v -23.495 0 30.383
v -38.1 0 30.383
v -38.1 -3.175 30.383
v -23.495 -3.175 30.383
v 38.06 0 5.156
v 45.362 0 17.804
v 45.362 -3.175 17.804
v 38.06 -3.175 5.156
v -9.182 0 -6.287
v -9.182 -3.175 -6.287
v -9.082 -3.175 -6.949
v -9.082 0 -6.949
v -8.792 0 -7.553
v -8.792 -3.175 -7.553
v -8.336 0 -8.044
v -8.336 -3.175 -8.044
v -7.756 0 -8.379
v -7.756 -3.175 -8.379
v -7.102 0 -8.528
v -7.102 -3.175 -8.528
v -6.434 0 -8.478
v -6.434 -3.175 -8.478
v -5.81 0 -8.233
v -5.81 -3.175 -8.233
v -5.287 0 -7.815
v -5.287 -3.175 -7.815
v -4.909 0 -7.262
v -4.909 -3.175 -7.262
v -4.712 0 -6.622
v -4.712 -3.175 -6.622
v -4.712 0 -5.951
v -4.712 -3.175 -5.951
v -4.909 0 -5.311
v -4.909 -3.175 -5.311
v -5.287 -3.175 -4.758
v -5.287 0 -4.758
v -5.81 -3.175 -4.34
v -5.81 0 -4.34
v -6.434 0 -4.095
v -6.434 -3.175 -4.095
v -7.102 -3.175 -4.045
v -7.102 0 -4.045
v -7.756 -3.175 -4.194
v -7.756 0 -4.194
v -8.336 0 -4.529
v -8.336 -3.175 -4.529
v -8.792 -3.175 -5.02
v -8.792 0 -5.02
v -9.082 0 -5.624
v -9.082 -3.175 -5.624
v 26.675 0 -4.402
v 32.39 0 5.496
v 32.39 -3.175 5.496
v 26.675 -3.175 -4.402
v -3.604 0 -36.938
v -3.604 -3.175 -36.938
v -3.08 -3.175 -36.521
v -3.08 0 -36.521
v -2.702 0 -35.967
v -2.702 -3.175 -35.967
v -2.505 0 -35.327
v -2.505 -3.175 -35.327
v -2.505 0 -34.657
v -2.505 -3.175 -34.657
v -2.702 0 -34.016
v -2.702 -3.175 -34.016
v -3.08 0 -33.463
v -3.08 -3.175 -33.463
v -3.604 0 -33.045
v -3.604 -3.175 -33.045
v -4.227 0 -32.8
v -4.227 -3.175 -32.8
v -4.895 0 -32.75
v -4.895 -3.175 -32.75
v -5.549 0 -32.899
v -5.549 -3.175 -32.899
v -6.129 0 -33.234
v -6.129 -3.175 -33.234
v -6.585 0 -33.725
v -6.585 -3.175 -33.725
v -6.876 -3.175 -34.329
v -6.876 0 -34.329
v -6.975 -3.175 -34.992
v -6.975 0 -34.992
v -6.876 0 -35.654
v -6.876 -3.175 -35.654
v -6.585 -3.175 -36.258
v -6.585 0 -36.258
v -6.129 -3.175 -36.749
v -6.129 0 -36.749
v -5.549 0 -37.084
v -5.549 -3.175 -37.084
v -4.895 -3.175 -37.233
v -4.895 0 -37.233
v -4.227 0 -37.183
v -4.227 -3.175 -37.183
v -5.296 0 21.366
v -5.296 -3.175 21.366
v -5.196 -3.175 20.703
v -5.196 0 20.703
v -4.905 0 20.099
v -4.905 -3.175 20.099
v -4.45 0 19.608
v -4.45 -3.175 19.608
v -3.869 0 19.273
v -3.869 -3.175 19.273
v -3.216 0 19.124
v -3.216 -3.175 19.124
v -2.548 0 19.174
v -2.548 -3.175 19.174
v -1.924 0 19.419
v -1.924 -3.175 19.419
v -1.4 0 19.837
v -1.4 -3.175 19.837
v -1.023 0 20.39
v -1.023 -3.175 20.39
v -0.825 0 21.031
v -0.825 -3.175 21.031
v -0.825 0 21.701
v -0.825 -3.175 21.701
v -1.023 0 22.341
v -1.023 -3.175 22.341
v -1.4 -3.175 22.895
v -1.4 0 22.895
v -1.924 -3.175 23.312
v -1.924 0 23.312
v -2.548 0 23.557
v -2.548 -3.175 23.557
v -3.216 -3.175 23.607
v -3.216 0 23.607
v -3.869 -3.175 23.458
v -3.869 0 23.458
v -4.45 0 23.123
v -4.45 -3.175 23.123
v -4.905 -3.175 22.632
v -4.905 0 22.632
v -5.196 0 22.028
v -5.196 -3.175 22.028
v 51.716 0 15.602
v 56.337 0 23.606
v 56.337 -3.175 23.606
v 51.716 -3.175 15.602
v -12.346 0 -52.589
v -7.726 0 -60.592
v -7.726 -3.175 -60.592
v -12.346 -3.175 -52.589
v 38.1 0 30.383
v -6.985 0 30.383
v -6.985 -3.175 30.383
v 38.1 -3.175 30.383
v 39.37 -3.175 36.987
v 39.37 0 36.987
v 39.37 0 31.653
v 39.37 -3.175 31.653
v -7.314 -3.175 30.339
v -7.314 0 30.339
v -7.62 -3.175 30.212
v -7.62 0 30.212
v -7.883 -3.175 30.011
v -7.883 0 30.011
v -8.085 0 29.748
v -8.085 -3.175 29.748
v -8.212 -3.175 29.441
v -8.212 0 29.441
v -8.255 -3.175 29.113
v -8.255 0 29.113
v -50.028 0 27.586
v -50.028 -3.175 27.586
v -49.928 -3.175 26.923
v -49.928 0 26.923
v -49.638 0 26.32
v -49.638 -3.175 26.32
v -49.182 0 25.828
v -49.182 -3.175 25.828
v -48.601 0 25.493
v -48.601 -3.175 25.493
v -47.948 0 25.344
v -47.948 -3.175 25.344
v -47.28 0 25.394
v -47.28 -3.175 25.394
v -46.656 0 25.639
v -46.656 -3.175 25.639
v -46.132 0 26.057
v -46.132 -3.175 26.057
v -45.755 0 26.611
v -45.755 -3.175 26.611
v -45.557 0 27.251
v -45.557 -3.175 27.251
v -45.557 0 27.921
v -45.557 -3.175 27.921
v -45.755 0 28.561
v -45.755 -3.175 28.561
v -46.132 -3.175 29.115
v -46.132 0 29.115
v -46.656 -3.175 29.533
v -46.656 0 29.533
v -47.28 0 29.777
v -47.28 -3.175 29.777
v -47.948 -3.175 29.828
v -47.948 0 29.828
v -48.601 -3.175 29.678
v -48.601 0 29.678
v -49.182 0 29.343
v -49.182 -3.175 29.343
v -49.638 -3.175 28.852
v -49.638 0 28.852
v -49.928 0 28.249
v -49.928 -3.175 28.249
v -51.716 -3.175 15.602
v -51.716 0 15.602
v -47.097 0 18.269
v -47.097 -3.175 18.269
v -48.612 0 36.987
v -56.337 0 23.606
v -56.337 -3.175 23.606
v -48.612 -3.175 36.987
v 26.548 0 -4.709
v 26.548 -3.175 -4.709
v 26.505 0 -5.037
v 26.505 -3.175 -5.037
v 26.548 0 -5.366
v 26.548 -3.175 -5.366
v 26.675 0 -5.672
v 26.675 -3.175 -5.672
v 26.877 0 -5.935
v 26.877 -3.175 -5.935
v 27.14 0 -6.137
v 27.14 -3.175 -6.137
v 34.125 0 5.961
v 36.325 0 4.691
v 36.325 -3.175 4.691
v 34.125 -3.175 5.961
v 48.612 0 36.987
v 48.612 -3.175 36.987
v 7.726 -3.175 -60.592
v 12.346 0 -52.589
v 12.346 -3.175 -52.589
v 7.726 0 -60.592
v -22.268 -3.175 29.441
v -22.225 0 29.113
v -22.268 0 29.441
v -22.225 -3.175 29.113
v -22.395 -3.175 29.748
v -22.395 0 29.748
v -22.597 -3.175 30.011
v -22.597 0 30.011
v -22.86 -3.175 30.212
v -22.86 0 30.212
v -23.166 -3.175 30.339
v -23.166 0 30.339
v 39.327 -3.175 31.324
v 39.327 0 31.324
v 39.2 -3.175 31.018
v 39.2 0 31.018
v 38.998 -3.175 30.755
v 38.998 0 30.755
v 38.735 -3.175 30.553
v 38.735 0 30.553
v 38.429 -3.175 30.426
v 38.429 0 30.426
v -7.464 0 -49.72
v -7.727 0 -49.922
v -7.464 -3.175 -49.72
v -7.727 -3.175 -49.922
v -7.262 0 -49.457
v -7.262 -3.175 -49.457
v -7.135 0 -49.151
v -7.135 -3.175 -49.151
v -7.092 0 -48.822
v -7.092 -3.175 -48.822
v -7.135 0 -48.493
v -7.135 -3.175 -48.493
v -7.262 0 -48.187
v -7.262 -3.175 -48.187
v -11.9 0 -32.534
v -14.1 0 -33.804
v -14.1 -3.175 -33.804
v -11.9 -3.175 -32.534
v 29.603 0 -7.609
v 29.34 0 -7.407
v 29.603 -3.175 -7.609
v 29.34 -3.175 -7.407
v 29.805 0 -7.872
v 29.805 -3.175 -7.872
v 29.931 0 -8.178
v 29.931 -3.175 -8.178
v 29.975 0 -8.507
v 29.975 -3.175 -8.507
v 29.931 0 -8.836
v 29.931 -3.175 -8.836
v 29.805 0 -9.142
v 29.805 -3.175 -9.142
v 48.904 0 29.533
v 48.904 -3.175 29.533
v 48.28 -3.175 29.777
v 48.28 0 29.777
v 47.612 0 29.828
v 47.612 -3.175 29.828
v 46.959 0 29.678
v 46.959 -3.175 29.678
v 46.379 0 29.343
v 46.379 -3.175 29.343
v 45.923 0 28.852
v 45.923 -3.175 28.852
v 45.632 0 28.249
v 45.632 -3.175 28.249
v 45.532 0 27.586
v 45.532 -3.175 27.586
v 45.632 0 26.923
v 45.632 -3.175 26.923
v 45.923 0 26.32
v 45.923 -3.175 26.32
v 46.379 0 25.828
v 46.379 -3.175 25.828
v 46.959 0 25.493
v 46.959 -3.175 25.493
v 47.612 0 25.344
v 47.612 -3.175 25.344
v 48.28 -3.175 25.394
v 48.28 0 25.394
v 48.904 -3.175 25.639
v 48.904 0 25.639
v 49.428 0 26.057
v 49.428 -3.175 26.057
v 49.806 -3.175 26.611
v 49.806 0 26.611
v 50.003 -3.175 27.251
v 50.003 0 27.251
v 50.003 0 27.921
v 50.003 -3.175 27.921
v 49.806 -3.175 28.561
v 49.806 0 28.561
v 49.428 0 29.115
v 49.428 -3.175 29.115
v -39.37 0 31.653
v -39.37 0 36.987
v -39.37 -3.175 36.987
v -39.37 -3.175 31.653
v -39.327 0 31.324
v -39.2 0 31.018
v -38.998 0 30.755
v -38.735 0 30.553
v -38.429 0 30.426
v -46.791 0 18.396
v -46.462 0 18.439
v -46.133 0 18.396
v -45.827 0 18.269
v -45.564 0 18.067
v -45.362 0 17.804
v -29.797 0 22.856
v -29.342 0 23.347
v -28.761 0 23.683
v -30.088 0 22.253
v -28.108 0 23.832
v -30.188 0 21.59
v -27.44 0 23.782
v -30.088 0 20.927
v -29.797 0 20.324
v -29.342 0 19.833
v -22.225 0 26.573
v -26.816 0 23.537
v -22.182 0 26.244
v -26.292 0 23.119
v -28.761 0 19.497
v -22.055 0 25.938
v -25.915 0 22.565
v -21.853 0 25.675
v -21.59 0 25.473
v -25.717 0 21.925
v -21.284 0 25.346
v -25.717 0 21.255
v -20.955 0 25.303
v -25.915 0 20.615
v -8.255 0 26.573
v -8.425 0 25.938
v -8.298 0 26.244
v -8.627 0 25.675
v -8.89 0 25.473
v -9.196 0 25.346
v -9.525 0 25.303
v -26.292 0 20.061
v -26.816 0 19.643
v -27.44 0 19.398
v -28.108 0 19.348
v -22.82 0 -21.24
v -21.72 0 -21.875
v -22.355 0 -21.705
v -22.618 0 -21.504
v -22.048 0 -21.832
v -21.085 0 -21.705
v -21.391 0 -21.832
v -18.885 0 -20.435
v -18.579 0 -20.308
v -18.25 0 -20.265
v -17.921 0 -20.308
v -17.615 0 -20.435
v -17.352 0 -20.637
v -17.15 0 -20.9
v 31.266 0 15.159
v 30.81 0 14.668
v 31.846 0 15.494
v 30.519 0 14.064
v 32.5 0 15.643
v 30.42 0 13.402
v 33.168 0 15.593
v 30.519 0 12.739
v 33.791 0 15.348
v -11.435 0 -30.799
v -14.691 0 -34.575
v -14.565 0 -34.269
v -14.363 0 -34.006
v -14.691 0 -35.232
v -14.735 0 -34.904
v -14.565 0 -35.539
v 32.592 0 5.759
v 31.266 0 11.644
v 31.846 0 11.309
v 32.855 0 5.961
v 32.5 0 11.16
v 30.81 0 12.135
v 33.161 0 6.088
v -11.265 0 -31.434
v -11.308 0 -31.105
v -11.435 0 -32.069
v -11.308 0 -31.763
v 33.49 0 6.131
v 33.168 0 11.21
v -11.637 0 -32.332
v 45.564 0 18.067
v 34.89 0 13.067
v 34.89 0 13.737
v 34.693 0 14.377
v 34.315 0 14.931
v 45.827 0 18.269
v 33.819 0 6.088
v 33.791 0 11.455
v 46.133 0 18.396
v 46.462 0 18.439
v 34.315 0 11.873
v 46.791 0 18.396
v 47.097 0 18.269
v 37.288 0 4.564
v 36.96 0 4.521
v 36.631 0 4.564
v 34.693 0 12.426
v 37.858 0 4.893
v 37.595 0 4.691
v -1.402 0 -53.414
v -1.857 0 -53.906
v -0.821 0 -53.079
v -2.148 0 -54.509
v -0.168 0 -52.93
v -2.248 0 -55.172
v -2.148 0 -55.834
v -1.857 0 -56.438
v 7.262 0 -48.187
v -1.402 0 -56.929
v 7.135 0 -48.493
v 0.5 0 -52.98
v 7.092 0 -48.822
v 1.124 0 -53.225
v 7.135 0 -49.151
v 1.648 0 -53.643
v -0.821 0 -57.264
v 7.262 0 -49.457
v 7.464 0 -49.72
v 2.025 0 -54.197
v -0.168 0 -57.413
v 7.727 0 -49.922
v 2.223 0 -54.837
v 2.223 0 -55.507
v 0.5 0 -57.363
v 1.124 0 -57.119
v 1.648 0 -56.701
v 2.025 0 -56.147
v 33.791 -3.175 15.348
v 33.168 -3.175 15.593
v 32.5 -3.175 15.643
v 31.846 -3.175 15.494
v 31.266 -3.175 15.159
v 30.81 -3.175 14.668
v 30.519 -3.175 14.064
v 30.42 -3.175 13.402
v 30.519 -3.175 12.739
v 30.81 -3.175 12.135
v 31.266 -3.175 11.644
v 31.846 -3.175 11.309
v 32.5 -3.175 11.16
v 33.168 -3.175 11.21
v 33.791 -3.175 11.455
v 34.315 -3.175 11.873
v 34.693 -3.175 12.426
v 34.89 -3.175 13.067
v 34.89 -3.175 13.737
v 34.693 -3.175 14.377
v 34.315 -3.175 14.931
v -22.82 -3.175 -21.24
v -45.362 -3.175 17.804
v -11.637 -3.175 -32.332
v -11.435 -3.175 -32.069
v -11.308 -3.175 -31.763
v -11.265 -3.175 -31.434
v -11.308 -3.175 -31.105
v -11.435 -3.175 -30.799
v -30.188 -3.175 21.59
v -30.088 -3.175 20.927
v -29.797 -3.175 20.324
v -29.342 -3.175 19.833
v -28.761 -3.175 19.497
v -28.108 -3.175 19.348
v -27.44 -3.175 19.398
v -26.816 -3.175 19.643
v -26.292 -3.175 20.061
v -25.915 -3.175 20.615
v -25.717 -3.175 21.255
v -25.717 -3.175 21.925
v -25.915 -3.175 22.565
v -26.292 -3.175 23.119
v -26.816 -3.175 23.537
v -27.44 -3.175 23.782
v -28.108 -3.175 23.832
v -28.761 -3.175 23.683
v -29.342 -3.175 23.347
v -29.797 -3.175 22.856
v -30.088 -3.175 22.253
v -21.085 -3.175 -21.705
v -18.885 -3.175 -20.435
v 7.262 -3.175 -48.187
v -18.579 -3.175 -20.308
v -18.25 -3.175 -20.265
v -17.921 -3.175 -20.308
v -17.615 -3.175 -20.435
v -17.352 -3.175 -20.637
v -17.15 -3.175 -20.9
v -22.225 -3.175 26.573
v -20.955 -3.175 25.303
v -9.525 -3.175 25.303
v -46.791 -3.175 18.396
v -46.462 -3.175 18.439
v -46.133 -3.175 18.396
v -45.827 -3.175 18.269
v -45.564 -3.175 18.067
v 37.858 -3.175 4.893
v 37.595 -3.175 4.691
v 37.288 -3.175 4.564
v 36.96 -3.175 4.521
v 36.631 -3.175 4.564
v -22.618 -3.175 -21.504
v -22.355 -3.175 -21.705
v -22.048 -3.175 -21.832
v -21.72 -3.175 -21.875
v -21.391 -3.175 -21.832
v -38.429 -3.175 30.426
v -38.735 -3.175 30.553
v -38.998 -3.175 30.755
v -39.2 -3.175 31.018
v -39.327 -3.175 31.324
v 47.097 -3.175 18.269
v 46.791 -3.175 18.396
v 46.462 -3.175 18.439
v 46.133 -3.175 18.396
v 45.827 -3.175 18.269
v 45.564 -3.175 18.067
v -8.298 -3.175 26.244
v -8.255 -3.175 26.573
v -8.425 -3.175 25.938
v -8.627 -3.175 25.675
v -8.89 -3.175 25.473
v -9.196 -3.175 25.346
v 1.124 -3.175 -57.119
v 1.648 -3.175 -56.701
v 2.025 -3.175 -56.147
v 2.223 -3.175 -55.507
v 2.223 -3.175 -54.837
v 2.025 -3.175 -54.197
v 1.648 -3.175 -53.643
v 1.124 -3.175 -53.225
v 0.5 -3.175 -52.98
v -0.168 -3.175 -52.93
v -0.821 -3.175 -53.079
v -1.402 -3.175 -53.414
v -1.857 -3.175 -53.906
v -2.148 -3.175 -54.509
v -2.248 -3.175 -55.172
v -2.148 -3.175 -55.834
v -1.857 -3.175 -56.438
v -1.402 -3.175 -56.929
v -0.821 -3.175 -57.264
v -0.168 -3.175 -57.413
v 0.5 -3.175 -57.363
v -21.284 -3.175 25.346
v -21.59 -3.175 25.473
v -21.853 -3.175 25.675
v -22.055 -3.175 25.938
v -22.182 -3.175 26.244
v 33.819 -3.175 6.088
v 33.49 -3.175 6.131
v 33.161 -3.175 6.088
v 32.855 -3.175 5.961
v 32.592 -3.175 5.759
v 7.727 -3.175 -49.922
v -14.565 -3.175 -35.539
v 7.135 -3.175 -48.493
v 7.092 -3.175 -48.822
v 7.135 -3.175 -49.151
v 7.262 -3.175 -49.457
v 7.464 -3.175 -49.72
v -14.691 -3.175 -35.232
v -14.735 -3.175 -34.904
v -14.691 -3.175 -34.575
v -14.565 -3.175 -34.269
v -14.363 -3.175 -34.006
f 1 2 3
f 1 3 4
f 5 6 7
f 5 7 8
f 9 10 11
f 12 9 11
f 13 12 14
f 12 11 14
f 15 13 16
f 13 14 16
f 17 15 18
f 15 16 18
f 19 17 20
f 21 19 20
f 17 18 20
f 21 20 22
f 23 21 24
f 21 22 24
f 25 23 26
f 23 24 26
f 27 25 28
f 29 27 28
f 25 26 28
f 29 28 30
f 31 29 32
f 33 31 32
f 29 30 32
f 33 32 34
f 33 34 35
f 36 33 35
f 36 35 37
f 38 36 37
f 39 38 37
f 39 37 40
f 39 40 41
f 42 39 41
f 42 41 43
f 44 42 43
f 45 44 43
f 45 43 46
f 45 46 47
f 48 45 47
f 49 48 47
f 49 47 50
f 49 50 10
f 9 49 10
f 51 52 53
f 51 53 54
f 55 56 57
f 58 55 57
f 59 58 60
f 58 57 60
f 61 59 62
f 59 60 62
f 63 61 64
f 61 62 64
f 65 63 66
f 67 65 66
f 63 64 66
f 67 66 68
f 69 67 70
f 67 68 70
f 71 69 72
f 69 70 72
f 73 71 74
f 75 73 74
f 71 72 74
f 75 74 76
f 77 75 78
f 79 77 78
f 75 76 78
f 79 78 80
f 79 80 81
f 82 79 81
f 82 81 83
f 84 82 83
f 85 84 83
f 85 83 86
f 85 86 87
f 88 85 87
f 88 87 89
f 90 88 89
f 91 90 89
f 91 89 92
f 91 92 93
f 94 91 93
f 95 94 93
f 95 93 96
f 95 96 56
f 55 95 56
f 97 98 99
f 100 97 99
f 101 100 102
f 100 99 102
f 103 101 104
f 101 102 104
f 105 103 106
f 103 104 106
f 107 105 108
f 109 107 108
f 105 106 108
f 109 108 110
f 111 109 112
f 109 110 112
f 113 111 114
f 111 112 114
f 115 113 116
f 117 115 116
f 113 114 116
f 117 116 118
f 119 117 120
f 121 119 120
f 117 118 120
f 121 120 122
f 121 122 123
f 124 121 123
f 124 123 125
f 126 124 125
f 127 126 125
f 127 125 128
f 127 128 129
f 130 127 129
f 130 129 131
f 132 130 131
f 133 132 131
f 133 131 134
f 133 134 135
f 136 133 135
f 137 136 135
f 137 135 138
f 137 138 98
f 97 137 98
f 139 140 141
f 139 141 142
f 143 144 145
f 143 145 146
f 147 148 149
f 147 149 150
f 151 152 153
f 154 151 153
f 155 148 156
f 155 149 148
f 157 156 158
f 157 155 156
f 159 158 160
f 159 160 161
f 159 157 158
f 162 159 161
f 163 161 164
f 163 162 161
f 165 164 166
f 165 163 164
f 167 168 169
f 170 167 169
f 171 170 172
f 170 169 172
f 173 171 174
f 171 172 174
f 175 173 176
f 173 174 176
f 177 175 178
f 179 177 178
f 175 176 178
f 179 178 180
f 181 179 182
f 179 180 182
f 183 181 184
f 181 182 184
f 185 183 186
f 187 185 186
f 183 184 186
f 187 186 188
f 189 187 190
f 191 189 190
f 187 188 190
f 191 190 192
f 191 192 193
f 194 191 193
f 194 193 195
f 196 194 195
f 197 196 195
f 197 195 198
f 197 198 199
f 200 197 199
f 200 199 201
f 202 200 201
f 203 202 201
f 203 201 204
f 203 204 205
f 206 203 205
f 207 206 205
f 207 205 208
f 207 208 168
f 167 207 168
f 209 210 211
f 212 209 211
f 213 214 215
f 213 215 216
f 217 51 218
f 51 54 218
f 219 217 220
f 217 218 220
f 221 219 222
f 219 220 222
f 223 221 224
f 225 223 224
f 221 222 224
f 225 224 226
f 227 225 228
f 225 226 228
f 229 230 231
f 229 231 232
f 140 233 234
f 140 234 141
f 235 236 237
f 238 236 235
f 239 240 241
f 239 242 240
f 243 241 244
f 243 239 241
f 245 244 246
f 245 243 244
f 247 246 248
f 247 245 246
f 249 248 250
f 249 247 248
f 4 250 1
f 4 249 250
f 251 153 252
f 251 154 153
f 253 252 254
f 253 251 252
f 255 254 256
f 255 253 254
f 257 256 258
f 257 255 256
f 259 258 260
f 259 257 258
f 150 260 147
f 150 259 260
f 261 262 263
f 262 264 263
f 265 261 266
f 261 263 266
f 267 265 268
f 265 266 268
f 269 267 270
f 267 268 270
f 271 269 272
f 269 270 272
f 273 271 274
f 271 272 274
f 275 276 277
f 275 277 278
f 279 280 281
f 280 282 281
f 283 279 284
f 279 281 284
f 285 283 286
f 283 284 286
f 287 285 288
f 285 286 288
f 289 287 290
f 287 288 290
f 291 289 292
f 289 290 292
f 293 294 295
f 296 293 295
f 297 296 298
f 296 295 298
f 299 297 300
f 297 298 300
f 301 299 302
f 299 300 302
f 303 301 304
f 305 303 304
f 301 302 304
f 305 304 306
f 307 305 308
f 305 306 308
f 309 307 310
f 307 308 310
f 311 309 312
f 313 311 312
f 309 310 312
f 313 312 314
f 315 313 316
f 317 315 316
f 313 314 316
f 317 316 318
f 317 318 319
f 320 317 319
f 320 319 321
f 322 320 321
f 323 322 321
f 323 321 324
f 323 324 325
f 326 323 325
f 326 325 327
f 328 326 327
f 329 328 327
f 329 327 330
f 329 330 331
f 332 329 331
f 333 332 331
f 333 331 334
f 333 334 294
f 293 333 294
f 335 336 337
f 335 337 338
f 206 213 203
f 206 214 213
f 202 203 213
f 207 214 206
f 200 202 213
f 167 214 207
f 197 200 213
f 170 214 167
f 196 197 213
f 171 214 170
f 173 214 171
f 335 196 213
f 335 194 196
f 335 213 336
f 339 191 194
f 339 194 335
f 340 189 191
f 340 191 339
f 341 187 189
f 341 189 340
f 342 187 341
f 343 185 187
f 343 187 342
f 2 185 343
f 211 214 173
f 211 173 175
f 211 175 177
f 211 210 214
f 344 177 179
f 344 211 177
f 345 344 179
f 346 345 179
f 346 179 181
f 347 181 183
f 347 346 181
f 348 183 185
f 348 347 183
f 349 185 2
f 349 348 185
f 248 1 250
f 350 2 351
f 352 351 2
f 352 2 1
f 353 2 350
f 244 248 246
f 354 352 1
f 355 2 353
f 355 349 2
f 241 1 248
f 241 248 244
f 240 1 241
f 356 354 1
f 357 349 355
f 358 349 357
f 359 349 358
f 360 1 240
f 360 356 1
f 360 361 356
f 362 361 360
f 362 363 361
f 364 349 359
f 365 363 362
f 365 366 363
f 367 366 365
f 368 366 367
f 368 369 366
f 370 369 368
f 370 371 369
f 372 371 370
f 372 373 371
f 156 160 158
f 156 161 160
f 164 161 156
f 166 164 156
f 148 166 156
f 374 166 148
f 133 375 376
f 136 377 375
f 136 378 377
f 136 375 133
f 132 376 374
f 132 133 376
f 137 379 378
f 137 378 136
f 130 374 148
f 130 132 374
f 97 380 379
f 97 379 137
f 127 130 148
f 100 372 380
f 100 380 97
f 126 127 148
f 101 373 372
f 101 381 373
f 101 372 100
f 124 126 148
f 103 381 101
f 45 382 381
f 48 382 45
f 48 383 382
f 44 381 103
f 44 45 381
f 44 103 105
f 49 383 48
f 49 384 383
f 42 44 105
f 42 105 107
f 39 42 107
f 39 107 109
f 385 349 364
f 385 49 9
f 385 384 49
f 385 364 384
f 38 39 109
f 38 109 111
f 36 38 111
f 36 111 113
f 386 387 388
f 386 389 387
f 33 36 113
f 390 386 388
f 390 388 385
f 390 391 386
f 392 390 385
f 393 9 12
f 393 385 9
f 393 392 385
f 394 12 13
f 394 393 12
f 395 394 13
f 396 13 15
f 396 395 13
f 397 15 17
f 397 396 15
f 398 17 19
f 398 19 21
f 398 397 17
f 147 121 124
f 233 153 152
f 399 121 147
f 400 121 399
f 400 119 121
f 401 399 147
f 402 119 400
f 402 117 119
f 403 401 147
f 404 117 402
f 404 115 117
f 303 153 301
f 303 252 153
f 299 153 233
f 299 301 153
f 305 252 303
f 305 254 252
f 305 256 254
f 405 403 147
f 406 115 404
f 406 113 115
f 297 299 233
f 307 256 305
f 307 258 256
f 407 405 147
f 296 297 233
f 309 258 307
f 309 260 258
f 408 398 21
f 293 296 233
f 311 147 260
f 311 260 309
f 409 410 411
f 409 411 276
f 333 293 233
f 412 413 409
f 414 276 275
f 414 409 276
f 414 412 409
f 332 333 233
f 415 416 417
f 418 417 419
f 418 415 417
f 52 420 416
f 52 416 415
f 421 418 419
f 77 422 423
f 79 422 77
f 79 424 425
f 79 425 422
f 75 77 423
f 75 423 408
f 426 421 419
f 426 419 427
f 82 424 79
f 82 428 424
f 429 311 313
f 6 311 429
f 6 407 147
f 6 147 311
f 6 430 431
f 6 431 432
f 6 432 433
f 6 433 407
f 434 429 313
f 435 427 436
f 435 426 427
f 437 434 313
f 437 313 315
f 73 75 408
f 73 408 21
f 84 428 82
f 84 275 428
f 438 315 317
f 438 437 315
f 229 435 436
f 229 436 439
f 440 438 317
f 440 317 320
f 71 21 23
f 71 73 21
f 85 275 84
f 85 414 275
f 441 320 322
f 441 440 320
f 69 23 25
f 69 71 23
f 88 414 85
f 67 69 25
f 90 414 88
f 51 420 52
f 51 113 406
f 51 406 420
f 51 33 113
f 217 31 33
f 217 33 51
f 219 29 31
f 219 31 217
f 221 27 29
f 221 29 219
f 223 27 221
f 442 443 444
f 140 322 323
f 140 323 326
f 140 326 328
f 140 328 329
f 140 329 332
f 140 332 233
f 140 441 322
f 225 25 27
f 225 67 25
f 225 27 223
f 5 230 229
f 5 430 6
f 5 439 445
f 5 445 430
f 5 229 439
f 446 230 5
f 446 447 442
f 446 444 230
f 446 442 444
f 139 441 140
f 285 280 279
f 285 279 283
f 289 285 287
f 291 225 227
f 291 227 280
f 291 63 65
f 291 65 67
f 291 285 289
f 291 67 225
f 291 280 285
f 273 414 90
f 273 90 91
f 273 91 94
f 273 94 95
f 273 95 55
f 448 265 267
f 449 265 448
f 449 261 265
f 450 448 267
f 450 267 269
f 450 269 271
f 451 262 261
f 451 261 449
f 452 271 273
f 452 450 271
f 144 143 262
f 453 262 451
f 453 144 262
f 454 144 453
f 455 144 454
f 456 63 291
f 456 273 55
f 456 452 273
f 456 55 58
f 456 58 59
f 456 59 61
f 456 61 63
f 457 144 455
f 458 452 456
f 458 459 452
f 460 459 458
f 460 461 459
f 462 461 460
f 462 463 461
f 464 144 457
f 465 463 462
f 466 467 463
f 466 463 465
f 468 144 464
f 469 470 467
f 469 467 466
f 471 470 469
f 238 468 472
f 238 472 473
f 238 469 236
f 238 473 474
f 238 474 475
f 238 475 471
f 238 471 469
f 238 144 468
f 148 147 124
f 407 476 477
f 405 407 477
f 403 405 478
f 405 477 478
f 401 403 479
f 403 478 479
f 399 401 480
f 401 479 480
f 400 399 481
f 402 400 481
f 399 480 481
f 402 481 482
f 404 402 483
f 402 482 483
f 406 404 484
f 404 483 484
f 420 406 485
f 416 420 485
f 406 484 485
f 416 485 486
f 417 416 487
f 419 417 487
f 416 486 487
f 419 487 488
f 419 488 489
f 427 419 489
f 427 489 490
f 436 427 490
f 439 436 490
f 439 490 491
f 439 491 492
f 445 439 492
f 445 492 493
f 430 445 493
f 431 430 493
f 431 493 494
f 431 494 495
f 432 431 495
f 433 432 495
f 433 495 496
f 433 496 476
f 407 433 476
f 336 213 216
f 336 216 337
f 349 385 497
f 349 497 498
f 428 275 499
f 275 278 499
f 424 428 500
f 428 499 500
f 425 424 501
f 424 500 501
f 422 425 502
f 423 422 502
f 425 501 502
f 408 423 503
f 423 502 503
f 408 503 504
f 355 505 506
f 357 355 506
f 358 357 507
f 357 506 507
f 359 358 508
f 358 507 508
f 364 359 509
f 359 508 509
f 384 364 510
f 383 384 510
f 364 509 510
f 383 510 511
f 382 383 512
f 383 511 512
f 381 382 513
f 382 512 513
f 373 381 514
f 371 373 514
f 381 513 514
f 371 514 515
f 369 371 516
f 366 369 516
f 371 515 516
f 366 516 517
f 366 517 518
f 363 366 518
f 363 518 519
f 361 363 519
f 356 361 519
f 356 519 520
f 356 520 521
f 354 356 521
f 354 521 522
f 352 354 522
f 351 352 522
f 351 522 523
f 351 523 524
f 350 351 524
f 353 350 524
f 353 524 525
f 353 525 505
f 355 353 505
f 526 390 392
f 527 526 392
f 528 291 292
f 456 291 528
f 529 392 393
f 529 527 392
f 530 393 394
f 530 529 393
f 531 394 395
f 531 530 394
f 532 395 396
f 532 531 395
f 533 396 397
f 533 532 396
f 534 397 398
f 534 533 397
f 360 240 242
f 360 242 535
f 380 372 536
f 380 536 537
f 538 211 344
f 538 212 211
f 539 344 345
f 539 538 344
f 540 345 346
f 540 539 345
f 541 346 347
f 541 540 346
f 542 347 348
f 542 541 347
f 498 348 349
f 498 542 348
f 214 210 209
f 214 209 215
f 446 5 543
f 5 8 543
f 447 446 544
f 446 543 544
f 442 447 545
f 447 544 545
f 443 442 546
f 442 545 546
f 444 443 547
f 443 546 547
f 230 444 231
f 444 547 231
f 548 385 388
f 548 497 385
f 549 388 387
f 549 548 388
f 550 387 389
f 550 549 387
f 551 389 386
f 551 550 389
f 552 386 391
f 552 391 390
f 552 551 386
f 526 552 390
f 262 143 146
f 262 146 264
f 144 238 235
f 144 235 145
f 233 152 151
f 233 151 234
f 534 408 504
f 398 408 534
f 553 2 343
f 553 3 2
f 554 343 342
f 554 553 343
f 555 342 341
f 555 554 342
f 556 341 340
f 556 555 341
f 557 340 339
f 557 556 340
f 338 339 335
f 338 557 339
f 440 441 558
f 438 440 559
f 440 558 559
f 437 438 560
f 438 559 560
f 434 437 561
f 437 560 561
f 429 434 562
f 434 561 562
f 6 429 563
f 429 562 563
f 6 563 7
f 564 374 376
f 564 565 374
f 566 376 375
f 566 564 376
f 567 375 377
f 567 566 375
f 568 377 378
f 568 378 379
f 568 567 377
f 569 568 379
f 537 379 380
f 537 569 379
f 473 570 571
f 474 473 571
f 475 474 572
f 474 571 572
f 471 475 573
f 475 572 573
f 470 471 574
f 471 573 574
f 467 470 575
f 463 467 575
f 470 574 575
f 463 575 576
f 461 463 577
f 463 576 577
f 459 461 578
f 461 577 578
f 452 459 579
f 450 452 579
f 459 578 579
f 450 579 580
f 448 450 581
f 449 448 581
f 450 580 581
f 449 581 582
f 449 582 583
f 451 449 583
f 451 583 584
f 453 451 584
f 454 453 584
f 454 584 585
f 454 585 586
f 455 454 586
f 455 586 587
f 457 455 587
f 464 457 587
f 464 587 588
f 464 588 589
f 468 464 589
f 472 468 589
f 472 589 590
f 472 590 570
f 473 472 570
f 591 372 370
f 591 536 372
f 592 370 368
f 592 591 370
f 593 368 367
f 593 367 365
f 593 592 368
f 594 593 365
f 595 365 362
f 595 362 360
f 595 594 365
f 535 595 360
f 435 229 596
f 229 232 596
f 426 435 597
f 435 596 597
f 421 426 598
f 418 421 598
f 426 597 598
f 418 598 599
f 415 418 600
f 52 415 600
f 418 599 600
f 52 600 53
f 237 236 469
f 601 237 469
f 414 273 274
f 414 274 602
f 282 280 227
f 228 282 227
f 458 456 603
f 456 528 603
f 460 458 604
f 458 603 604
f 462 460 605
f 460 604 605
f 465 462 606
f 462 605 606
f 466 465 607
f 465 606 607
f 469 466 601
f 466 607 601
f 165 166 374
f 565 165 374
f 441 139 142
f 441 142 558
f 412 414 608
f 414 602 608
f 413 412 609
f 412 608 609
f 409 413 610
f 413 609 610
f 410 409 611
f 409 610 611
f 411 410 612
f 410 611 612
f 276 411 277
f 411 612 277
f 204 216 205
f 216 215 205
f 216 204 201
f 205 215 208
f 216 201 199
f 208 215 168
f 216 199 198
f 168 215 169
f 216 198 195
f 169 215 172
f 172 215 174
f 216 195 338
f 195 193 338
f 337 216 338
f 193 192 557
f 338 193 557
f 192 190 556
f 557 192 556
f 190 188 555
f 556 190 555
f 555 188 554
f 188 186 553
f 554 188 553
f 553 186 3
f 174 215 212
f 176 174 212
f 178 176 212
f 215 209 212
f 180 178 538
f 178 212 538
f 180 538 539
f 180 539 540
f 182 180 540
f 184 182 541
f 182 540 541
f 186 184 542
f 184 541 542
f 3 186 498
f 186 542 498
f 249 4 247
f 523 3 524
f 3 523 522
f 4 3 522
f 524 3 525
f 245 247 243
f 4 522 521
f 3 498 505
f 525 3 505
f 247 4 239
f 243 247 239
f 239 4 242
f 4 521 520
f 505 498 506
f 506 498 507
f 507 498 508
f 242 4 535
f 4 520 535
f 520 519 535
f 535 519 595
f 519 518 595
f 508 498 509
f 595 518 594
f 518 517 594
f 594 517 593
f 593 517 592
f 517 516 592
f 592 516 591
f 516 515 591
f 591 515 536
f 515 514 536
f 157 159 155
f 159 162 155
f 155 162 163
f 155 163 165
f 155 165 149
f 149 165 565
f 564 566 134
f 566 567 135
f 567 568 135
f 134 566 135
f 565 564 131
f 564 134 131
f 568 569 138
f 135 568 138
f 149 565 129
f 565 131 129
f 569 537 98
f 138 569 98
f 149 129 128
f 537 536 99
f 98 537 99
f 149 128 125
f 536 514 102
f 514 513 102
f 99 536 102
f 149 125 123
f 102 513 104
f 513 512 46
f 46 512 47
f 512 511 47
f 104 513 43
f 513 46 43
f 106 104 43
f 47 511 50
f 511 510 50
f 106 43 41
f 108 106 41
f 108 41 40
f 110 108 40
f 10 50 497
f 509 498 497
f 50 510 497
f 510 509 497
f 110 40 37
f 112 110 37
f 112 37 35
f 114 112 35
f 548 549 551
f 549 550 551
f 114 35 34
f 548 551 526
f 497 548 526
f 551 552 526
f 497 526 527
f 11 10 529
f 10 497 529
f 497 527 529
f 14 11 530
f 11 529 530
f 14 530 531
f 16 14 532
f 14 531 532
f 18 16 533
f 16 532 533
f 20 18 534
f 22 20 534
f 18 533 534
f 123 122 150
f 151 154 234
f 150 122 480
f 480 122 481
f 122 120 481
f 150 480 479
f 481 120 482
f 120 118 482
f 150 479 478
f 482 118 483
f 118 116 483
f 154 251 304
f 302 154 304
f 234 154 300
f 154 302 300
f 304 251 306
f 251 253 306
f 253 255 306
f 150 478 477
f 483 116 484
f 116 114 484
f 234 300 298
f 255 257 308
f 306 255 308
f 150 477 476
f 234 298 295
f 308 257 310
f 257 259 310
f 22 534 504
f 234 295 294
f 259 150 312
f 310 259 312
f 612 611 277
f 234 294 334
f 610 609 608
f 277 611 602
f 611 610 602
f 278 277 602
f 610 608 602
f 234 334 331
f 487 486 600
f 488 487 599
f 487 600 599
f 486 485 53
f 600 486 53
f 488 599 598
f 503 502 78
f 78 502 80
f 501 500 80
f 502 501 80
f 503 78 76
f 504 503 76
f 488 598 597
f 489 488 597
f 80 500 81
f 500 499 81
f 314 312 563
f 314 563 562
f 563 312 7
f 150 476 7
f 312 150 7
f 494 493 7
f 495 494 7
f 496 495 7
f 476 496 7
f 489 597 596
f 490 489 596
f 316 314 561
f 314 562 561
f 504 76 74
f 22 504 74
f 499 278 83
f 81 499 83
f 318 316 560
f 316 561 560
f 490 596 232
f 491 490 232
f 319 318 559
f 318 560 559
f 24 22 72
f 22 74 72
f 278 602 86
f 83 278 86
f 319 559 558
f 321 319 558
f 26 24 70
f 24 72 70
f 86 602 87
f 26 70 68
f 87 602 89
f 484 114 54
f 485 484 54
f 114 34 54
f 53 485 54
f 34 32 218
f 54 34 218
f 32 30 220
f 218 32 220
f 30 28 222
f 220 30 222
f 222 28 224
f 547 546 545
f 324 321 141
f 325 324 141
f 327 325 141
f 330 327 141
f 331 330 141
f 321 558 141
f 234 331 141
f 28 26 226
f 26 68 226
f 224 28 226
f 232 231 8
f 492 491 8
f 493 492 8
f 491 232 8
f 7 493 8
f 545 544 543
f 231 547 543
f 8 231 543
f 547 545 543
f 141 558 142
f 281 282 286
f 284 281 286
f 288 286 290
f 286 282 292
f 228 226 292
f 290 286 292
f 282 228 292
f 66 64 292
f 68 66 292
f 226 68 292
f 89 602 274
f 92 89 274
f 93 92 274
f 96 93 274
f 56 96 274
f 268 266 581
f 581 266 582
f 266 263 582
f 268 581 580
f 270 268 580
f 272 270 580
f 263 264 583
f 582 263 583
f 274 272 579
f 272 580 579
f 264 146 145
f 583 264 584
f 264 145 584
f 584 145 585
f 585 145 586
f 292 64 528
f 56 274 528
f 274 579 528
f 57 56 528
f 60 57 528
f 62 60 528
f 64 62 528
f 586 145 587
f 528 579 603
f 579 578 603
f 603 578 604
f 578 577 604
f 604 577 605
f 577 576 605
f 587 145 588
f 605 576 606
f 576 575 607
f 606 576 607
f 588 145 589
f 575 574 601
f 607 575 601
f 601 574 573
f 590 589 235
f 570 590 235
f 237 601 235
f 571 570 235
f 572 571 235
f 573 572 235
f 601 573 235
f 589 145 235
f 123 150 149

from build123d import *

# Parameters (mm, degrees)
BOSS_EXTRUDE1_DEPTH      = 3.175
SKETCH2_W                = 78.74
SKETCH2_H                = 6.604
CUT_EXTRUDE1_DEPTH       = 83.797133034
SKETCH8_W                = 13.97
SKETCH8_H                = 5.08
CUT_EXTRUDE2_DEPTH       = 83.797133034
FILLET1_R                = 1.27
F_8_CLEARANCE_HOLE1_D    = 4.4958
CIRPATTERN1_COUNT        = 3
FILLET1_OF_CIRPATTERN1_R = 1.27
F_8_CLEARANCE_HOLE2_D    = 4.4958
CIRPATTERN2_COUNT        = 3
F_8_CLEARANCE_HOLE3_D    = 4.4958


with BuildPart() as part:
    # Sketch1 → Boss-Extrude1 (new body)
    with BuildSketch(Plane(origin=(0, 0, 0), x_dir=(1, 0, 0), z_dir=(0, 1, 0))):
        Polygon((48.611580185, -36.986616861), (56.337139895, -23.605554928), (7.725559709, 60.592171789), (-7.725559709, 60.592171789), (-56.337139895, -23.605554928), (-48.611580185, -36.986616861), align=None)
    extrude(amount=-BOSS_EXTRUDE1_DEPTH)

    # Sketch2 → Cut-Extrude1 (cut, through all)
    with BuildSketch(Plane(origin=(0, 0, 0), x_dir=(1, 0, 0), z_dir=(0, 1, 0))):
        with Locations((0, -33.684616861)):
            Rectangle(SKETCH2_W, SKETCH2_H)
    cut_extrude1 = extrude(amount=-CUT_EXTRUDE1_DEPTH, mode=Mode.SUBTRACT)

    # Sketch8 → Cut-Extrude2 (cut, through all)
    with BuildSketch(Plane(origin=(0, 0, 0), x_dir=(1, 0, 0), z_dir=(0, 1, 0))):
        with Locations((-15.24, -27.842616861)):
            Rectangle(SKETCH8_W, SKETCH8_H)
    cut_extrude2 = extrude(amount=-CUT_EXTRUDE2_DEPTH, mode=Mode.SUBTRACT)

    # Fillet1
    fillet1_edges = [part.edges().sort_by_distance(p)[0] for p in [
        (-39.37, -1.5875, 30.382616861),
        (39.37, -1.5875, 30.382616861),
        (-8.255, -1.5875, 25.302616861),
        (-22.225, -1.5875, 25.302616861),
        (-8.255, -1.5875, 30.382616861),
        (-22.225, -1.5875, 30.382616861),
    ]]
    fillet(fillet1_edges, radius=FILLET1_R)

    # #8 Clearance Hole1 (through all)
    with Locations(Plane(origin=(0, 0, 0), x_dir=(1, 0, 0), z_dir=(0, 1, 0))):
        with Locations((-47.780246463, -27.585938157)):
            f_8_clearance_hole1 = Hole(F_8_CLEARANCE_HOLE1_D / 2)

    # CirPattern1: Cut-Extrude1, Cut-Extrude2, #8 Clearance Hole1 ×3 about axis
    cirpattern1_axis = Axis((0, 0.15875, 0), (0, -1, 0))
    add([cut_extrude1.rotate(cirpattern1_axis, i * 360 / CIRPATTERN1_COUNT) for i in range(1, CIRPATTERN1_COUNT)], mode=Mode.SUBTRACT)
    add([cut_extrude2.rotate(cirpattern1_axis, i * 360 / CIRPATTERN1_COUNT) for i in range(1, CIRPATTERN1_COUNT)], mode=Mode.SUBTRACT)
    add([f_8_clearance_hole1.rotate(cirpattern1_axis, i * 360 / CIRPATTERN1_COUNT) for i in range(1, CIRPATTERN1_COUNT)], mode=Mode.SUBTRACT)

    # Fillet1 of CirPattern1
    fillet1_of_cirpattern1_edges = [part.edges().sort_by_distance(p)[0] for p in [
        (-6.627118036, -1.5875, -49.286728578),
        (-45.997118036, -1.5875, 18.904111716),
        (-17.785208984, -1.5875, -19.800348139),
        (-10.800208984, -1.5875, -31.89872303),
        (-22.184618036, -1.5875, -22.340348139),
        (-15.199618036, -1.5875, -34.43872303),
        (45.997118036, -1.5875, 18.904111716),
        (6.627118036, -1.5875, -49.286728578),
        (26.040208984, -1.5875, -5.502268723),
        (33.025208984, -1.5875, 6.596106168),
        (30.439618036, -1.5875, -8.042268723),
        (37.424618036, -1.5875, 4.056106168),
    ]]
    fillet(fillet1_of_cirpattern1_edges, radius=FILLET1_OF_CIRPATTERN1_R)

    # #8 Clearance Hole2 (through all)
    with Locations(Plane(origin=(0, 0, 0), x_dir=(1, 0, 0), z_dir=(0, 1, 0))):
        with Locations((-27.94, -21.59)):
            f_8_clearance_hole2 = Hole(F_8_CLEARANCE_HOLE2_D / 2)

    # CirPattern2: #8 Clearance Hole2 ×3 about axis
    cirpattern2_axis = Axis((0, 8.034658337, 0), (0, -1, 0))
    for i in range(1, CIRPATTERN2_COUNT):
        add(f_8_clearance_hole2.rotate(cirpattern2_axis, i * 360 / CIRPATTERN2_COUNT), mode=Mode.SUBTRACT)

    # #8 Clearance Hole3 (through all)
    with Locations(Plane(origin=(0, 0, 0), x_dir=(1, 0, 0), z_dir=(0, 1, 0))):
        with Locations((-6.934384891, 6.286512516), (-3.048, -21.365616861)):
            Hole(F_8_CLEARANCE_HOLE3_D / 2)


solid = part.part
